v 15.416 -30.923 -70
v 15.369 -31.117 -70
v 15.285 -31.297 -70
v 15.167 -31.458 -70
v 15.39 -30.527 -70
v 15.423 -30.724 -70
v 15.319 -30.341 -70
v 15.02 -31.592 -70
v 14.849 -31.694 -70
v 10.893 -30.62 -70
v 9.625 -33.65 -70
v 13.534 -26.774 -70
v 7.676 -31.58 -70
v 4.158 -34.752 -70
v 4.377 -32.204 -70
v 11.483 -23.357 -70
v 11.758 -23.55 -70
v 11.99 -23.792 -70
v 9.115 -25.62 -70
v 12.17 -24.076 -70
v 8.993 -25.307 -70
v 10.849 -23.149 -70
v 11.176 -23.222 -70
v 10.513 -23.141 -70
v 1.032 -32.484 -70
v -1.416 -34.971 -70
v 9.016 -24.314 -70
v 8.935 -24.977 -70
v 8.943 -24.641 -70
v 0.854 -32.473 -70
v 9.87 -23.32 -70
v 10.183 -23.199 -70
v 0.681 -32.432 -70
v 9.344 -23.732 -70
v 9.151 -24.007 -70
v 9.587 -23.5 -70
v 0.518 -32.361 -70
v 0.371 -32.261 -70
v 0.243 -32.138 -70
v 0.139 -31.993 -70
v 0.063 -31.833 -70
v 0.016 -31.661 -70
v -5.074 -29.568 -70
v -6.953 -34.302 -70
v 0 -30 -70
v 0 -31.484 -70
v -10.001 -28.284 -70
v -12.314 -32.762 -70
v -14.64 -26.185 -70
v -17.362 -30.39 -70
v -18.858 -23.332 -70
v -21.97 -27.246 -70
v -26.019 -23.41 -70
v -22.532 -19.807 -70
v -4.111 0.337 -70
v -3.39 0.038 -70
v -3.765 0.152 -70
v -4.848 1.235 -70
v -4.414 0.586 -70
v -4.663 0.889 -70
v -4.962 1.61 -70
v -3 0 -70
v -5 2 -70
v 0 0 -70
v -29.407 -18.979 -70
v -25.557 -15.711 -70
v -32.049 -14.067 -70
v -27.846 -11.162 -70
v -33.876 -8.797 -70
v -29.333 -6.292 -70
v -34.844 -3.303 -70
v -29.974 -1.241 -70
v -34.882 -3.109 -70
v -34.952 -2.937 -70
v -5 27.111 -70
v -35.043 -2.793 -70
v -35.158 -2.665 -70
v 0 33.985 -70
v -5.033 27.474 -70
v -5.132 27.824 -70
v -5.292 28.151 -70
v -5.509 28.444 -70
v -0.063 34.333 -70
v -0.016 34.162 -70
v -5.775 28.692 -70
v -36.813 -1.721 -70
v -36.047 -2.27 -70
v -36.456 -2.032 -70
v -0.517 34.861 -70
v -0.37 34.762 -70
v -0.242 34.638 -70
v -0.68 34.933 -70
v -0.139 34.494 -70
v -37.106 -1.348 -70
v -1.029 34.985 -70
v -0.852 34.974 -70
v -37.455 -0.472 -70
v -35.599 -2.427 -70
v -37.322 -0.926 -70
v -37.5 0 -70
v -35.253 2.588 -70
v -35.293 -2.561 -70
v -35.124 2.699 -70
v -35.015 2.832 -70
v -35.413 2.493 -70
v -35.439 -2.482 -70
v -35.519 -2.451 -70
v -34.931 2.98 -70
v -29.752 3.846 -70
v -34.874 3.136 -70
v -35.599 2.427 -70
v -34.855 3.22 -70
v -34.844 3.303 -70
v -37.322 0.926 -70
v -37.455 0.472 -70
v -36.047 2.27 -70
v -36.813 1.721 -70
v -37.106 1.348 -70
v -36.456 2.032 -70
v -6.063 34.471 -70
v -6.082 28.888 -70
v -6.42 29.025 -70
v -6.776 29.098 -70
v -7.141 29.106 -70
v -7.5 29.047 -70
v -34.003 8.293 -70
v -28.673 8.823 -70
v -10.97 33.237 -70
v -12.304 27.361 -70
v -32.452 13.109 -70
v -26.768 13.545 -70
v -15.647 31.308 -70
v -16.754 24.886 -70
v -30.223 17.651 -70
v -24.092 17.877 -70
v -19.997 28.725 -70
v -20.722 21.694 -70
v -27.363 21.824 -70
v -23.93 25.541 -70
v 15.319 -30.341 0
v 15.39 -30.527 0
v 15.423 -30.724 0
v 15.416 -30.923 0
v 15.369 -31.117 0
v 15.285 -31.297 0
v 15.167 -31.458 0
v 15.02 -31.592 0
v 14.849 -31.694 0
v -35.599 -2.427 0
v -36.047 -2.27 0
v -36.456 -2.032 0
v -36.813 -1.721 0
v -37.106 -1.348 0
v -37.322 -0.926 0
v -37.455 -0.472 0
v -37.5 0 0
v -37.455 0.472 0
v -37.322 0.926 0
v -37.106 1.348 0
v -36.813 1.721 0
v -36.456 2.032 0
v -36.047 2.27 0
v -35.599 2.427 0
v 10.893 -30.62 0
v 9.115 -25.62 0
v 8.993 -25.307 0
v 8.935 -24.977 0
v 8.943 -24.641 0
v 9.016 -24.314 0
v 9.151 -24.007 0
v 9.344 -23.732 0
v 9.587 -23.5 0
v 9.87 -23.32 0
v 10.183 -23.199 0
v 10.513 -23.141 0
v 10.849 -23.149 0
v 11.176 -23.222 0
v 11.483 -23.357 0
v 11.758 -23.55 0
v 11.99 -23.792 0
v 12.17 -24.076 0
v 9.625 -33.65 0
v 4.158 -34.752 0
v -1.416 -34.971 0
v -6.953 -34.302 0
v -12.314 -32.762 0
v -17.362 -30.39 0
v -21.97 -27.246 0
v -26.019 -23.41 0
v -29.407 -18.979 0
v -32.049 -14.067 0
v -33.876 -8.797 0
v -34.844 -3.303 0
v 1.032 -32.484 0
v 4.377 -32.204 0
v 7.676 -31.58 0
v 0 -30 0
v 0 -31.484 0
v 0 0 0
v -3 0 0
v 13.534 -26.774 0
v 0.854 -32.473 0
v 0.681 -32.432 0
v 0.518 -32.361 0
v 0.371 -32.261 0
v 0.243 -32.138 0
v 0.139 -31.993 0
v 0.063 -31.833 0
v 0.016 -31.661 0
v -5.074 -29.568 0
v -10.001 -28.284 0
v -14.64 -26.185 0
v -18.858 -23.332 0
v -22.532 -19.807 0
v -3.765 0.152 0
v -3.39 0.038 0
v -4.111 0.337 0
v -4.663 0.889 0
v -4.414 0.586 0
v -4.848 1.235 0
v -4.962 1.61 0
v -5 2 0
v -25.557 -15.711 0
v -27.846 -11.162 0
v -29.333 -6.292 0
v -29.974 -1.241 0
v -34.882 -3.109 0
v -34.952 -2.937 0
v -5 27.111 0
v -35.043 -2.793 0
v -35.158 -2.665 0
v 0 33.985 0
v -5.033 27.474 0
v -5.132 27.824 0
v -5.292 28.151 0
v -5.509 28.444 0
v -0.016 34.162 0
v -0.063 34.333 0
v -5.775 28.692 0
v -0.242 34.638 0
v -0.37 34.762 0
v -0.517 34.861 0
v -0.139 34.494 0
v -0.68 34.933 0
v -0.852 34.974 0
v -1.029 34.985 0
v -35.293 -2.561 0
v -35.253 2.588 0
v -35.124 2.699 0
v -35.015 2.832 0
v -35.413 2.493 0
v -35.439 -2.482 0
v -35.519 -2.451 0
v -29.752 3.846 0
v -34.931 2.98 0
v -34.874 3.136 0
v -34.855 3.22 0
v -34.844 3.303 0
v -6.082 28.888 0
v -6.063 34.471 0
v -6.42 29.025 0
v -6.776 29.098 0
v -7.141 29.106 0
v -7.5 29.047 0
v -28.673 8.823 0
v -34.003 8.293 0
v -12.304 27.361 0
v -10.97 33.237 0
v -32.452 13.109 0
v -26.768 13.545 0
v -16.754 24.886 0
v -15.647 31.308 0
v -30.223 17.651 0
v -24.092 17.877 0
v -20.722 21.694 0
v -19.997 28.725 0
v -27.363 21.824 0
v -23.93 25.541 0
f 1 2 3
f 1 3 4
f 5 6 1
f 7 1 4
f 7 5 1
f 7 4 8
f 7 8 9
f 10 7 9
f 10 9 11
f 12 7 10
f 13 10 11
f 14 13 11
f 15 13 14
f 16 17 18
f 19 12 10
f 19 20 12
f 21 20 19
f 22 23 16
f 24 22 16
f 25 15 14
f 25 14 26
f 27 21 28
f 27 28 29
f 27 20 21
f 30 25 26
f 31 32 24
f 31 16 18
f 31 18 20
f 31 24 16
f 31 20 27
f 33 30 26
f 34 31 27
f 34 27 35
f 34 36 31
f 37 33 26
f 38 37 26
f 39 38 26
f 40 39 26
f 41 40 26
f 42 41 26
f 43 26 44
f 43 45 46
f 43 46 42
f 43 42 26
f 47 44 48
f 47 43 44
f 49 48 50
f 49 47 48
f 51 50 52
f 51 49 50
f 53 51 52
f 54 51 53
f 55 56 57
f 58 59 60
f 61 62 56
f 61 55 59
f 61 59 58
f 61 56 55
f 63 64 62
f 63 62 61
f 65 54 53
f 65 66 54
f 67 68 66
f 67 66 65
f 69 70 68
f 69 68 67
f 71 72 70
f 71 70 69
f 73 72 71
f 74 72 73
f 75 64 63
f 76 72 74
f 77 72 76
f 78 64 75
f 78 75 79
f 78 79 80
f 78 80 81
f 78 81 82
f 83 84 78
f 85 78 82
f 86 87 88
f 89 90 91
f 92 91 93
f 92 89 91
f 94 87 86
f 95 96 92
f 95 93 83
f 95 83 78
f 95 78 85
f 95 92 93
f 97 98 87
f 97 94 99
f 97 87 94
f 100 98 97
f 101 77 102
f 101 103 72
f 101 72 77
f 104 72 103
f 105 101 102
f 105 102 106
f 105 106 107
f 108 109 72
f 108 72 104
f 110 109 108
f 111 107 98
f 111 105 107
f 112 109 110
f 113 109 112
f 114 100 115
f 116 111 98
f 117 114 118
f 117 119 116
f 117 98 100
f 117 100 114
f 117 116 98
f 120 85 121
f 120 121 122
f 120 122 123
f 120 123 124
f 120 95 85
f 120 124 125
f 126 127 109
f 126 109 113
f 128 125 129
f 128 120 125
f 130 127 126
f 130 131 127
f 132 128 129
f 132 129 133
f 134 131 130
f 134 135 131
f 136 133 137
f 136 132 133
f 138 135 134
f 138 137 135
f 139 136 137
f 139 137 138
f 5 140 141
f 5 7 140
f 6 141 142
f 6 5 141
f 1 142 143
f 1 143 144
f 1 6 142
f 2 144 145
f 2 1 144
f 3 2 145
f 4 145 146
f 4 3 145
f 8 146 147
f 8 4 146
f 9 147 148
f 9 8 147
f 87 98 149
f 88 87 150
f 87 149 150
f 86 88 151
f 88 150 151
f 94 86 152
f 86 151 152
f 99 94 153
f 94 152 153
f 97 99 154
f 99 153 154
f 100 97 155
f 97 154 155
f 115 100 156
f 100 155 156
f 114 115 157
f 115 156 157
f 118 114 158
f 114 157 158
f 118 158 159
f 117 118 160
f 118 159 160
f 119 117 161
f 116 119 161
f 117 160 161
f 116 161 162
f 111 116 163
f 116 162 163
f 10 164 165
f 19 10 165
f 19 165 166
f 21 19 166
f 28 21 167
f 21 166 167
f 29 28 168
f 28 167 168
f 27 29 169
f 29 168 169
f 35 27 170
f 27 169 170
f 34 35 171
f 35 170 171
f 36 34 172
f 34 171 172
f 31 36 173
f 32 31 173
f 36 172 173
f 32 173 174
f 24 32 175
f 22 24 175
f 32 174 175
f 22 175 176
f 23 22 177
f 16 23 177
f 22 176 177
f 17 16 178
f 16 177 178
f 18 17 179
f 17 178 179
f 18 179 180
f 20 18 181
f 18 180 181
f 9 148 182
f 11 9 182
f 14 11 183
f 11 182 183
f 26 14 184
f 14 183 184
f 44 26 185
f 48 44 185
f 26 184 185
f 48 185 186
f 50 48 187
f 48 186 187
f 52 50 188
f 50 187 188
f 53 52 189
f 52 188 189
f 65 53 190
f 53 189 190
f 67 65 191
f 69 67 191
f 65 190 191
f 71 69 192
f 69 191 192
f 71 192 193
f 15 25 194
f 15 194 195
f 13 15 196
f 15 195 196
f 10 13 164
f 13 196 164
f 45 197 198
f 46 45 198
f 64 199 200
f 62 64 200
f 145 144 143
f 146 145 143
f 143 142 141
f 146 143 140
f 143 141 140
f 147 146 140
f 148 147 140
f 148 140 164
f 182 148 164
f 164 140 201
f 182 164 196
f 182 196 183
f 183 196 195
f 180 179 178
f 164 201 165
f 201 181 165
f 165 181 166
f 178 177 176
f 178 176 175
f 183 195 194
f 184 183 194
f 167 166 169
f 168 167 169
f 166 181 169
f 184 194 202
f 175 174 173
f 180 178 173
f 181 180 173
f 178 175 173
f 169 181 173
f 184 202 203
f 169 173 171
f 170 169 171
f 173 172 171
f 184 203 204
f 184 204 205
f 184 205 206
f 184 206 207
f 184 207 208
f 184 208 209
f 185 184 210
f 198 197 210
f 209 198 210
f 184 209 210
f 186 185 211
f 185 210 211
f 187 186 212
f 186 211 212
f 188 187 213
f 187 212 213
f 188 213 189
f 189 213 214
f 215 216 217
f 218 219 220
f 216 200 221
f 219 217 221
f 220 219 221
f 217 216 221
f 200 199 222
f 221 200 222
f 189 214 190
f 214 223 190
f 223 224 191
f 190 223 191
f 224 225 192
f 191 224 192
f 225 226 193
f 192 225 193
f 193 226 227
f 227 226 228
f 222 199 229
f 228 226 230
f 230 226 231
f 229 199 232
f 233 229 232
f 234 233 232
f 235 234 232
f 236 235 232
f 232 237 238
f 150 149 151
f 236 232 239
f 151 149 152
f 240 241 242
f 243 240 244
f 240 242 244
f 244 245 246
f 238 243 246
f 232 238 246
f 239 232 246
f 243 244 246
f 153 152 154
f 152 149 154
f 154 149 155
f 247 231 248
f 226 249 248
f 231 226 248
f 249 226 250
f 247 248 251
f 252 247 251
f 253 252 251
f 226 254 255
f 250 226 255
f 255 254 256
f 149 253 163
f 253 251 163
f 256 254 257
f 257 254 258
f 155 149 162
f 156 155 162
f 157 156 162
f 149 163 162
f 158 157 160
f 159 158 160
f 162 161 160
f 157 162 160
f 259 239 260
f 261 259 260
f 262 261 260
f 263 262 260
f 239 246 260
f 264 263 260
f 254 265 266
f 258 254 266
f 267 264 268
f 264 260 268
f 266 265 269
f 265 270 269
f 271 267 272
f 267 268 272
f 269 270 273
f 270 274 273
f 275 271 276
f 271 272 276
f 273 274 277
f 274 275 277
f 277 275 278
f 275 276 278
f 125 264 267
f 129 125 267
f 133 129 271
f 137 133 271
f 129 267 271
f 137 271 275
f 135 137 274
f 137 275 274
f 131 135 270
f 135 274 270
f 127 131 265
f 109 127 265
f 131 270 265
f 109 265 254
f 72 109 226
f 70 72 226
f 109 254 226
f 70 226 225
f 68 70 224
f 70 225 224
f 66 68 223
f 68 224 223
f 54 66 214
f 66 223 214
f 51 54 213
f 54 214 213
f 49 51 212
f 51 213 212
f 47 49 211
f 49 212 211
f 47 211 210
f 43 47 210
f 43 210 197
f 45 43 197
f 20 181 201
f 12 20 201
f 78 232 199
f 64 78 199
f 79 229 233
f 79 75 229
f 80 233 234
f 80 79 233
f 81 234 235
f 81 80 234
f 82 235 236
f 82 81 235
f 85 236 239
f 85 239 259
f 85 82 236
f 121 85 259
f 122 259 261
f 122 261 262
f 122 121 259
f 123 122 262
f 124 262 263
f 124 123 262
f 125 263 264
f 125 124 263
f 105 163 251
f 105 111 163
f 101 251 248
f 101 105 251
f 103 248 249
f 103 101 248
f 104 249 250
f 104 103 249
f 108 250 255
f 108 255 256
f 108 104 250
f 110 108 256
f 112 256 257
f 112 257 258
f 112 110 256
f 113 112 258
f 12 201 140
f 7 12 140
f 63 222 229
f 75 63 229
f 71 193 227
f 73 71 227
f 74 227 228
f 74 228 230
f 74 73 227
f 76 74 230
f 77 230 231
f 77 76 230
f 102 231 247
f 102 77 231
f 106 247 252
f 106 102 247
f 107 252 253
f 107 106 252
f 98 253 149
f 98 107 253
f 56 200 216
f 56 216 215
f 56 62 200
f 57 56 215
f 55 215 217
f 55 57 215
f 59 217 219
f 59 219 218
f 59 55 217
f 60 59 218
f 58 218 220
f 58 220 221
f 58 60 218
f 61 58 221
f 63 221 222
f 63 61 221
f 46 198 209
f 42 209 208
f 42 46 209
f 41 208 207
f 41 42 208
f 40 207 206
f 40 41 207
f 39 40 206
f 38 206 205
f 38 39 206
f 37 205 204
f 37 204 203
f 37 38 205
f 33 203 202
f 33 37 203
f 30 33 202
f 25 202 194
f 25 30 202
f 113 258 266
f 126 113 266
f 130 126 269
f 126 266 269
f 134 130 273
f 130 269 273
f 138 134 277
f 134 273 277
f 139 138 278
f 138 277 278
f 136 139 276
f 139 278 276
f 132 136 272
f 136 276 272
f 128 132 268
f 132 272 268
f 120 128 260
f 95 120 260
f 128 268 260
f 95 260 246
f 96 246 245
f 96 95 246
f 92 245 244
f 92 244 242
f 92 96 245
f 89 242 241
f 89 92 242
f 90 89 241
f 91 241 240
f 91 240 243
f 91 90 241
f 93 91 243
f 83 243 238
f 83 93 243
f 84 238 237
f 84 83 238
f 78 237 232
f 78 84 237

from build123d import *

# Parameters (mm, degrees)
BOSS_EXTRUDE1_DEPTH = 70
FILLET1_R           = 2
FILLET2_R           = 2
FILLET3_R           = 1
FILLET4_R           = 1
FILLET5_R           = 1
FILLET6_R           = 1


with BuildPart() as part:
    # Sketch1 → Boss-Extrude1 (new body)
    with BuildSketch(Plane.XY):
        with BuildLine():
            Line((0, 35), (0, 0))
            Line((0, 0), (-5, 0))
            Line((-5, 0), (-5, 29.580398915))
            ThreePointArc((-5, 29.580398915), (-29.894915684, -2.508787808), (0, -30))
            Line((0, -30), (0, -32.5))
            ThreePointArc((0, -32.5), (5.527213221, -32.026550142), (10.893389008, -30.619994708))
            Line((10.893389008, -30.619994708), (9.114585792, -25.619994708))
            ThreePointArc((9.114585792, -25.619994708), (9.870035541, -23.320104454), (12.169925795, -24.075554203))
            Line((12.169925795, -24.075554203), (13.533846284, -26.773774571))
            Line((13.533846284, -26.773774571), (15.771374385, -31.245219635))
            ThreePointArc((15.771374385, -31.245219635), (-17.267698729, -30.443826642), (-34.910714286, -2.498405104))
            ThreePointArc((-34.910714286, -2.498405104), (-37.5, 0), (-34.910714286, 2.498405104))
            ThreePointArc((-34.910714286, 2.498405104), (-23.849065195, 25.616832148), (0, 35))
        make_face()
    extrude(amount=-BOSS_EXTRUDE1_DEPTH)

    # Fillet1
    fillet1_edges = [part.edges().sort_by_distance(p)[0] for p in [
        (-5, 0, -35),
    ]]
    fillet(fillet1_edges, radius=FILLET1_R)

    # Fillet2
    fillet2_edges = [part.edges().sort_by_distance(p)[0] for p in [
        (-5, 29.580398915, -35),
    ]]
    fillet(fillet2_edges, radius=FILLET2_R)

    # Fillet3
    fillet3_edges = [part.edges().sort_by_distance(p)[0] for p in [
        (0, -32.5, -35),
    ]]
    fillet(fillet3_edges, radius=FILLET3_R)

    # Fillet4
    fillet4_edges = [part.edges().sort_by_distance(p)[0] for p in [
        (15.771374385, -31.245219635, -35),
    ]]
    fillet(fillet4_edges, radius=FILLET4_R)

    # Fillet5
    fillet5_edges = [part.edges().sort_by_distance(p)[0] for p in [
        (-34.910714286, -2.498405104, -35),
        (-34.910714286, 2.498405104, -35),
    ]]
    fillet(fillet5_edges, radius=FILLET5_R)

    # Fillet6
    fillet6_edges = [part.edges().sort_by_distance(p)[0] for p in [
        (0, 35, -35),
    ]]
    fillet(fillet6_edges, radius=FILLET6_R)


solid = part.part
